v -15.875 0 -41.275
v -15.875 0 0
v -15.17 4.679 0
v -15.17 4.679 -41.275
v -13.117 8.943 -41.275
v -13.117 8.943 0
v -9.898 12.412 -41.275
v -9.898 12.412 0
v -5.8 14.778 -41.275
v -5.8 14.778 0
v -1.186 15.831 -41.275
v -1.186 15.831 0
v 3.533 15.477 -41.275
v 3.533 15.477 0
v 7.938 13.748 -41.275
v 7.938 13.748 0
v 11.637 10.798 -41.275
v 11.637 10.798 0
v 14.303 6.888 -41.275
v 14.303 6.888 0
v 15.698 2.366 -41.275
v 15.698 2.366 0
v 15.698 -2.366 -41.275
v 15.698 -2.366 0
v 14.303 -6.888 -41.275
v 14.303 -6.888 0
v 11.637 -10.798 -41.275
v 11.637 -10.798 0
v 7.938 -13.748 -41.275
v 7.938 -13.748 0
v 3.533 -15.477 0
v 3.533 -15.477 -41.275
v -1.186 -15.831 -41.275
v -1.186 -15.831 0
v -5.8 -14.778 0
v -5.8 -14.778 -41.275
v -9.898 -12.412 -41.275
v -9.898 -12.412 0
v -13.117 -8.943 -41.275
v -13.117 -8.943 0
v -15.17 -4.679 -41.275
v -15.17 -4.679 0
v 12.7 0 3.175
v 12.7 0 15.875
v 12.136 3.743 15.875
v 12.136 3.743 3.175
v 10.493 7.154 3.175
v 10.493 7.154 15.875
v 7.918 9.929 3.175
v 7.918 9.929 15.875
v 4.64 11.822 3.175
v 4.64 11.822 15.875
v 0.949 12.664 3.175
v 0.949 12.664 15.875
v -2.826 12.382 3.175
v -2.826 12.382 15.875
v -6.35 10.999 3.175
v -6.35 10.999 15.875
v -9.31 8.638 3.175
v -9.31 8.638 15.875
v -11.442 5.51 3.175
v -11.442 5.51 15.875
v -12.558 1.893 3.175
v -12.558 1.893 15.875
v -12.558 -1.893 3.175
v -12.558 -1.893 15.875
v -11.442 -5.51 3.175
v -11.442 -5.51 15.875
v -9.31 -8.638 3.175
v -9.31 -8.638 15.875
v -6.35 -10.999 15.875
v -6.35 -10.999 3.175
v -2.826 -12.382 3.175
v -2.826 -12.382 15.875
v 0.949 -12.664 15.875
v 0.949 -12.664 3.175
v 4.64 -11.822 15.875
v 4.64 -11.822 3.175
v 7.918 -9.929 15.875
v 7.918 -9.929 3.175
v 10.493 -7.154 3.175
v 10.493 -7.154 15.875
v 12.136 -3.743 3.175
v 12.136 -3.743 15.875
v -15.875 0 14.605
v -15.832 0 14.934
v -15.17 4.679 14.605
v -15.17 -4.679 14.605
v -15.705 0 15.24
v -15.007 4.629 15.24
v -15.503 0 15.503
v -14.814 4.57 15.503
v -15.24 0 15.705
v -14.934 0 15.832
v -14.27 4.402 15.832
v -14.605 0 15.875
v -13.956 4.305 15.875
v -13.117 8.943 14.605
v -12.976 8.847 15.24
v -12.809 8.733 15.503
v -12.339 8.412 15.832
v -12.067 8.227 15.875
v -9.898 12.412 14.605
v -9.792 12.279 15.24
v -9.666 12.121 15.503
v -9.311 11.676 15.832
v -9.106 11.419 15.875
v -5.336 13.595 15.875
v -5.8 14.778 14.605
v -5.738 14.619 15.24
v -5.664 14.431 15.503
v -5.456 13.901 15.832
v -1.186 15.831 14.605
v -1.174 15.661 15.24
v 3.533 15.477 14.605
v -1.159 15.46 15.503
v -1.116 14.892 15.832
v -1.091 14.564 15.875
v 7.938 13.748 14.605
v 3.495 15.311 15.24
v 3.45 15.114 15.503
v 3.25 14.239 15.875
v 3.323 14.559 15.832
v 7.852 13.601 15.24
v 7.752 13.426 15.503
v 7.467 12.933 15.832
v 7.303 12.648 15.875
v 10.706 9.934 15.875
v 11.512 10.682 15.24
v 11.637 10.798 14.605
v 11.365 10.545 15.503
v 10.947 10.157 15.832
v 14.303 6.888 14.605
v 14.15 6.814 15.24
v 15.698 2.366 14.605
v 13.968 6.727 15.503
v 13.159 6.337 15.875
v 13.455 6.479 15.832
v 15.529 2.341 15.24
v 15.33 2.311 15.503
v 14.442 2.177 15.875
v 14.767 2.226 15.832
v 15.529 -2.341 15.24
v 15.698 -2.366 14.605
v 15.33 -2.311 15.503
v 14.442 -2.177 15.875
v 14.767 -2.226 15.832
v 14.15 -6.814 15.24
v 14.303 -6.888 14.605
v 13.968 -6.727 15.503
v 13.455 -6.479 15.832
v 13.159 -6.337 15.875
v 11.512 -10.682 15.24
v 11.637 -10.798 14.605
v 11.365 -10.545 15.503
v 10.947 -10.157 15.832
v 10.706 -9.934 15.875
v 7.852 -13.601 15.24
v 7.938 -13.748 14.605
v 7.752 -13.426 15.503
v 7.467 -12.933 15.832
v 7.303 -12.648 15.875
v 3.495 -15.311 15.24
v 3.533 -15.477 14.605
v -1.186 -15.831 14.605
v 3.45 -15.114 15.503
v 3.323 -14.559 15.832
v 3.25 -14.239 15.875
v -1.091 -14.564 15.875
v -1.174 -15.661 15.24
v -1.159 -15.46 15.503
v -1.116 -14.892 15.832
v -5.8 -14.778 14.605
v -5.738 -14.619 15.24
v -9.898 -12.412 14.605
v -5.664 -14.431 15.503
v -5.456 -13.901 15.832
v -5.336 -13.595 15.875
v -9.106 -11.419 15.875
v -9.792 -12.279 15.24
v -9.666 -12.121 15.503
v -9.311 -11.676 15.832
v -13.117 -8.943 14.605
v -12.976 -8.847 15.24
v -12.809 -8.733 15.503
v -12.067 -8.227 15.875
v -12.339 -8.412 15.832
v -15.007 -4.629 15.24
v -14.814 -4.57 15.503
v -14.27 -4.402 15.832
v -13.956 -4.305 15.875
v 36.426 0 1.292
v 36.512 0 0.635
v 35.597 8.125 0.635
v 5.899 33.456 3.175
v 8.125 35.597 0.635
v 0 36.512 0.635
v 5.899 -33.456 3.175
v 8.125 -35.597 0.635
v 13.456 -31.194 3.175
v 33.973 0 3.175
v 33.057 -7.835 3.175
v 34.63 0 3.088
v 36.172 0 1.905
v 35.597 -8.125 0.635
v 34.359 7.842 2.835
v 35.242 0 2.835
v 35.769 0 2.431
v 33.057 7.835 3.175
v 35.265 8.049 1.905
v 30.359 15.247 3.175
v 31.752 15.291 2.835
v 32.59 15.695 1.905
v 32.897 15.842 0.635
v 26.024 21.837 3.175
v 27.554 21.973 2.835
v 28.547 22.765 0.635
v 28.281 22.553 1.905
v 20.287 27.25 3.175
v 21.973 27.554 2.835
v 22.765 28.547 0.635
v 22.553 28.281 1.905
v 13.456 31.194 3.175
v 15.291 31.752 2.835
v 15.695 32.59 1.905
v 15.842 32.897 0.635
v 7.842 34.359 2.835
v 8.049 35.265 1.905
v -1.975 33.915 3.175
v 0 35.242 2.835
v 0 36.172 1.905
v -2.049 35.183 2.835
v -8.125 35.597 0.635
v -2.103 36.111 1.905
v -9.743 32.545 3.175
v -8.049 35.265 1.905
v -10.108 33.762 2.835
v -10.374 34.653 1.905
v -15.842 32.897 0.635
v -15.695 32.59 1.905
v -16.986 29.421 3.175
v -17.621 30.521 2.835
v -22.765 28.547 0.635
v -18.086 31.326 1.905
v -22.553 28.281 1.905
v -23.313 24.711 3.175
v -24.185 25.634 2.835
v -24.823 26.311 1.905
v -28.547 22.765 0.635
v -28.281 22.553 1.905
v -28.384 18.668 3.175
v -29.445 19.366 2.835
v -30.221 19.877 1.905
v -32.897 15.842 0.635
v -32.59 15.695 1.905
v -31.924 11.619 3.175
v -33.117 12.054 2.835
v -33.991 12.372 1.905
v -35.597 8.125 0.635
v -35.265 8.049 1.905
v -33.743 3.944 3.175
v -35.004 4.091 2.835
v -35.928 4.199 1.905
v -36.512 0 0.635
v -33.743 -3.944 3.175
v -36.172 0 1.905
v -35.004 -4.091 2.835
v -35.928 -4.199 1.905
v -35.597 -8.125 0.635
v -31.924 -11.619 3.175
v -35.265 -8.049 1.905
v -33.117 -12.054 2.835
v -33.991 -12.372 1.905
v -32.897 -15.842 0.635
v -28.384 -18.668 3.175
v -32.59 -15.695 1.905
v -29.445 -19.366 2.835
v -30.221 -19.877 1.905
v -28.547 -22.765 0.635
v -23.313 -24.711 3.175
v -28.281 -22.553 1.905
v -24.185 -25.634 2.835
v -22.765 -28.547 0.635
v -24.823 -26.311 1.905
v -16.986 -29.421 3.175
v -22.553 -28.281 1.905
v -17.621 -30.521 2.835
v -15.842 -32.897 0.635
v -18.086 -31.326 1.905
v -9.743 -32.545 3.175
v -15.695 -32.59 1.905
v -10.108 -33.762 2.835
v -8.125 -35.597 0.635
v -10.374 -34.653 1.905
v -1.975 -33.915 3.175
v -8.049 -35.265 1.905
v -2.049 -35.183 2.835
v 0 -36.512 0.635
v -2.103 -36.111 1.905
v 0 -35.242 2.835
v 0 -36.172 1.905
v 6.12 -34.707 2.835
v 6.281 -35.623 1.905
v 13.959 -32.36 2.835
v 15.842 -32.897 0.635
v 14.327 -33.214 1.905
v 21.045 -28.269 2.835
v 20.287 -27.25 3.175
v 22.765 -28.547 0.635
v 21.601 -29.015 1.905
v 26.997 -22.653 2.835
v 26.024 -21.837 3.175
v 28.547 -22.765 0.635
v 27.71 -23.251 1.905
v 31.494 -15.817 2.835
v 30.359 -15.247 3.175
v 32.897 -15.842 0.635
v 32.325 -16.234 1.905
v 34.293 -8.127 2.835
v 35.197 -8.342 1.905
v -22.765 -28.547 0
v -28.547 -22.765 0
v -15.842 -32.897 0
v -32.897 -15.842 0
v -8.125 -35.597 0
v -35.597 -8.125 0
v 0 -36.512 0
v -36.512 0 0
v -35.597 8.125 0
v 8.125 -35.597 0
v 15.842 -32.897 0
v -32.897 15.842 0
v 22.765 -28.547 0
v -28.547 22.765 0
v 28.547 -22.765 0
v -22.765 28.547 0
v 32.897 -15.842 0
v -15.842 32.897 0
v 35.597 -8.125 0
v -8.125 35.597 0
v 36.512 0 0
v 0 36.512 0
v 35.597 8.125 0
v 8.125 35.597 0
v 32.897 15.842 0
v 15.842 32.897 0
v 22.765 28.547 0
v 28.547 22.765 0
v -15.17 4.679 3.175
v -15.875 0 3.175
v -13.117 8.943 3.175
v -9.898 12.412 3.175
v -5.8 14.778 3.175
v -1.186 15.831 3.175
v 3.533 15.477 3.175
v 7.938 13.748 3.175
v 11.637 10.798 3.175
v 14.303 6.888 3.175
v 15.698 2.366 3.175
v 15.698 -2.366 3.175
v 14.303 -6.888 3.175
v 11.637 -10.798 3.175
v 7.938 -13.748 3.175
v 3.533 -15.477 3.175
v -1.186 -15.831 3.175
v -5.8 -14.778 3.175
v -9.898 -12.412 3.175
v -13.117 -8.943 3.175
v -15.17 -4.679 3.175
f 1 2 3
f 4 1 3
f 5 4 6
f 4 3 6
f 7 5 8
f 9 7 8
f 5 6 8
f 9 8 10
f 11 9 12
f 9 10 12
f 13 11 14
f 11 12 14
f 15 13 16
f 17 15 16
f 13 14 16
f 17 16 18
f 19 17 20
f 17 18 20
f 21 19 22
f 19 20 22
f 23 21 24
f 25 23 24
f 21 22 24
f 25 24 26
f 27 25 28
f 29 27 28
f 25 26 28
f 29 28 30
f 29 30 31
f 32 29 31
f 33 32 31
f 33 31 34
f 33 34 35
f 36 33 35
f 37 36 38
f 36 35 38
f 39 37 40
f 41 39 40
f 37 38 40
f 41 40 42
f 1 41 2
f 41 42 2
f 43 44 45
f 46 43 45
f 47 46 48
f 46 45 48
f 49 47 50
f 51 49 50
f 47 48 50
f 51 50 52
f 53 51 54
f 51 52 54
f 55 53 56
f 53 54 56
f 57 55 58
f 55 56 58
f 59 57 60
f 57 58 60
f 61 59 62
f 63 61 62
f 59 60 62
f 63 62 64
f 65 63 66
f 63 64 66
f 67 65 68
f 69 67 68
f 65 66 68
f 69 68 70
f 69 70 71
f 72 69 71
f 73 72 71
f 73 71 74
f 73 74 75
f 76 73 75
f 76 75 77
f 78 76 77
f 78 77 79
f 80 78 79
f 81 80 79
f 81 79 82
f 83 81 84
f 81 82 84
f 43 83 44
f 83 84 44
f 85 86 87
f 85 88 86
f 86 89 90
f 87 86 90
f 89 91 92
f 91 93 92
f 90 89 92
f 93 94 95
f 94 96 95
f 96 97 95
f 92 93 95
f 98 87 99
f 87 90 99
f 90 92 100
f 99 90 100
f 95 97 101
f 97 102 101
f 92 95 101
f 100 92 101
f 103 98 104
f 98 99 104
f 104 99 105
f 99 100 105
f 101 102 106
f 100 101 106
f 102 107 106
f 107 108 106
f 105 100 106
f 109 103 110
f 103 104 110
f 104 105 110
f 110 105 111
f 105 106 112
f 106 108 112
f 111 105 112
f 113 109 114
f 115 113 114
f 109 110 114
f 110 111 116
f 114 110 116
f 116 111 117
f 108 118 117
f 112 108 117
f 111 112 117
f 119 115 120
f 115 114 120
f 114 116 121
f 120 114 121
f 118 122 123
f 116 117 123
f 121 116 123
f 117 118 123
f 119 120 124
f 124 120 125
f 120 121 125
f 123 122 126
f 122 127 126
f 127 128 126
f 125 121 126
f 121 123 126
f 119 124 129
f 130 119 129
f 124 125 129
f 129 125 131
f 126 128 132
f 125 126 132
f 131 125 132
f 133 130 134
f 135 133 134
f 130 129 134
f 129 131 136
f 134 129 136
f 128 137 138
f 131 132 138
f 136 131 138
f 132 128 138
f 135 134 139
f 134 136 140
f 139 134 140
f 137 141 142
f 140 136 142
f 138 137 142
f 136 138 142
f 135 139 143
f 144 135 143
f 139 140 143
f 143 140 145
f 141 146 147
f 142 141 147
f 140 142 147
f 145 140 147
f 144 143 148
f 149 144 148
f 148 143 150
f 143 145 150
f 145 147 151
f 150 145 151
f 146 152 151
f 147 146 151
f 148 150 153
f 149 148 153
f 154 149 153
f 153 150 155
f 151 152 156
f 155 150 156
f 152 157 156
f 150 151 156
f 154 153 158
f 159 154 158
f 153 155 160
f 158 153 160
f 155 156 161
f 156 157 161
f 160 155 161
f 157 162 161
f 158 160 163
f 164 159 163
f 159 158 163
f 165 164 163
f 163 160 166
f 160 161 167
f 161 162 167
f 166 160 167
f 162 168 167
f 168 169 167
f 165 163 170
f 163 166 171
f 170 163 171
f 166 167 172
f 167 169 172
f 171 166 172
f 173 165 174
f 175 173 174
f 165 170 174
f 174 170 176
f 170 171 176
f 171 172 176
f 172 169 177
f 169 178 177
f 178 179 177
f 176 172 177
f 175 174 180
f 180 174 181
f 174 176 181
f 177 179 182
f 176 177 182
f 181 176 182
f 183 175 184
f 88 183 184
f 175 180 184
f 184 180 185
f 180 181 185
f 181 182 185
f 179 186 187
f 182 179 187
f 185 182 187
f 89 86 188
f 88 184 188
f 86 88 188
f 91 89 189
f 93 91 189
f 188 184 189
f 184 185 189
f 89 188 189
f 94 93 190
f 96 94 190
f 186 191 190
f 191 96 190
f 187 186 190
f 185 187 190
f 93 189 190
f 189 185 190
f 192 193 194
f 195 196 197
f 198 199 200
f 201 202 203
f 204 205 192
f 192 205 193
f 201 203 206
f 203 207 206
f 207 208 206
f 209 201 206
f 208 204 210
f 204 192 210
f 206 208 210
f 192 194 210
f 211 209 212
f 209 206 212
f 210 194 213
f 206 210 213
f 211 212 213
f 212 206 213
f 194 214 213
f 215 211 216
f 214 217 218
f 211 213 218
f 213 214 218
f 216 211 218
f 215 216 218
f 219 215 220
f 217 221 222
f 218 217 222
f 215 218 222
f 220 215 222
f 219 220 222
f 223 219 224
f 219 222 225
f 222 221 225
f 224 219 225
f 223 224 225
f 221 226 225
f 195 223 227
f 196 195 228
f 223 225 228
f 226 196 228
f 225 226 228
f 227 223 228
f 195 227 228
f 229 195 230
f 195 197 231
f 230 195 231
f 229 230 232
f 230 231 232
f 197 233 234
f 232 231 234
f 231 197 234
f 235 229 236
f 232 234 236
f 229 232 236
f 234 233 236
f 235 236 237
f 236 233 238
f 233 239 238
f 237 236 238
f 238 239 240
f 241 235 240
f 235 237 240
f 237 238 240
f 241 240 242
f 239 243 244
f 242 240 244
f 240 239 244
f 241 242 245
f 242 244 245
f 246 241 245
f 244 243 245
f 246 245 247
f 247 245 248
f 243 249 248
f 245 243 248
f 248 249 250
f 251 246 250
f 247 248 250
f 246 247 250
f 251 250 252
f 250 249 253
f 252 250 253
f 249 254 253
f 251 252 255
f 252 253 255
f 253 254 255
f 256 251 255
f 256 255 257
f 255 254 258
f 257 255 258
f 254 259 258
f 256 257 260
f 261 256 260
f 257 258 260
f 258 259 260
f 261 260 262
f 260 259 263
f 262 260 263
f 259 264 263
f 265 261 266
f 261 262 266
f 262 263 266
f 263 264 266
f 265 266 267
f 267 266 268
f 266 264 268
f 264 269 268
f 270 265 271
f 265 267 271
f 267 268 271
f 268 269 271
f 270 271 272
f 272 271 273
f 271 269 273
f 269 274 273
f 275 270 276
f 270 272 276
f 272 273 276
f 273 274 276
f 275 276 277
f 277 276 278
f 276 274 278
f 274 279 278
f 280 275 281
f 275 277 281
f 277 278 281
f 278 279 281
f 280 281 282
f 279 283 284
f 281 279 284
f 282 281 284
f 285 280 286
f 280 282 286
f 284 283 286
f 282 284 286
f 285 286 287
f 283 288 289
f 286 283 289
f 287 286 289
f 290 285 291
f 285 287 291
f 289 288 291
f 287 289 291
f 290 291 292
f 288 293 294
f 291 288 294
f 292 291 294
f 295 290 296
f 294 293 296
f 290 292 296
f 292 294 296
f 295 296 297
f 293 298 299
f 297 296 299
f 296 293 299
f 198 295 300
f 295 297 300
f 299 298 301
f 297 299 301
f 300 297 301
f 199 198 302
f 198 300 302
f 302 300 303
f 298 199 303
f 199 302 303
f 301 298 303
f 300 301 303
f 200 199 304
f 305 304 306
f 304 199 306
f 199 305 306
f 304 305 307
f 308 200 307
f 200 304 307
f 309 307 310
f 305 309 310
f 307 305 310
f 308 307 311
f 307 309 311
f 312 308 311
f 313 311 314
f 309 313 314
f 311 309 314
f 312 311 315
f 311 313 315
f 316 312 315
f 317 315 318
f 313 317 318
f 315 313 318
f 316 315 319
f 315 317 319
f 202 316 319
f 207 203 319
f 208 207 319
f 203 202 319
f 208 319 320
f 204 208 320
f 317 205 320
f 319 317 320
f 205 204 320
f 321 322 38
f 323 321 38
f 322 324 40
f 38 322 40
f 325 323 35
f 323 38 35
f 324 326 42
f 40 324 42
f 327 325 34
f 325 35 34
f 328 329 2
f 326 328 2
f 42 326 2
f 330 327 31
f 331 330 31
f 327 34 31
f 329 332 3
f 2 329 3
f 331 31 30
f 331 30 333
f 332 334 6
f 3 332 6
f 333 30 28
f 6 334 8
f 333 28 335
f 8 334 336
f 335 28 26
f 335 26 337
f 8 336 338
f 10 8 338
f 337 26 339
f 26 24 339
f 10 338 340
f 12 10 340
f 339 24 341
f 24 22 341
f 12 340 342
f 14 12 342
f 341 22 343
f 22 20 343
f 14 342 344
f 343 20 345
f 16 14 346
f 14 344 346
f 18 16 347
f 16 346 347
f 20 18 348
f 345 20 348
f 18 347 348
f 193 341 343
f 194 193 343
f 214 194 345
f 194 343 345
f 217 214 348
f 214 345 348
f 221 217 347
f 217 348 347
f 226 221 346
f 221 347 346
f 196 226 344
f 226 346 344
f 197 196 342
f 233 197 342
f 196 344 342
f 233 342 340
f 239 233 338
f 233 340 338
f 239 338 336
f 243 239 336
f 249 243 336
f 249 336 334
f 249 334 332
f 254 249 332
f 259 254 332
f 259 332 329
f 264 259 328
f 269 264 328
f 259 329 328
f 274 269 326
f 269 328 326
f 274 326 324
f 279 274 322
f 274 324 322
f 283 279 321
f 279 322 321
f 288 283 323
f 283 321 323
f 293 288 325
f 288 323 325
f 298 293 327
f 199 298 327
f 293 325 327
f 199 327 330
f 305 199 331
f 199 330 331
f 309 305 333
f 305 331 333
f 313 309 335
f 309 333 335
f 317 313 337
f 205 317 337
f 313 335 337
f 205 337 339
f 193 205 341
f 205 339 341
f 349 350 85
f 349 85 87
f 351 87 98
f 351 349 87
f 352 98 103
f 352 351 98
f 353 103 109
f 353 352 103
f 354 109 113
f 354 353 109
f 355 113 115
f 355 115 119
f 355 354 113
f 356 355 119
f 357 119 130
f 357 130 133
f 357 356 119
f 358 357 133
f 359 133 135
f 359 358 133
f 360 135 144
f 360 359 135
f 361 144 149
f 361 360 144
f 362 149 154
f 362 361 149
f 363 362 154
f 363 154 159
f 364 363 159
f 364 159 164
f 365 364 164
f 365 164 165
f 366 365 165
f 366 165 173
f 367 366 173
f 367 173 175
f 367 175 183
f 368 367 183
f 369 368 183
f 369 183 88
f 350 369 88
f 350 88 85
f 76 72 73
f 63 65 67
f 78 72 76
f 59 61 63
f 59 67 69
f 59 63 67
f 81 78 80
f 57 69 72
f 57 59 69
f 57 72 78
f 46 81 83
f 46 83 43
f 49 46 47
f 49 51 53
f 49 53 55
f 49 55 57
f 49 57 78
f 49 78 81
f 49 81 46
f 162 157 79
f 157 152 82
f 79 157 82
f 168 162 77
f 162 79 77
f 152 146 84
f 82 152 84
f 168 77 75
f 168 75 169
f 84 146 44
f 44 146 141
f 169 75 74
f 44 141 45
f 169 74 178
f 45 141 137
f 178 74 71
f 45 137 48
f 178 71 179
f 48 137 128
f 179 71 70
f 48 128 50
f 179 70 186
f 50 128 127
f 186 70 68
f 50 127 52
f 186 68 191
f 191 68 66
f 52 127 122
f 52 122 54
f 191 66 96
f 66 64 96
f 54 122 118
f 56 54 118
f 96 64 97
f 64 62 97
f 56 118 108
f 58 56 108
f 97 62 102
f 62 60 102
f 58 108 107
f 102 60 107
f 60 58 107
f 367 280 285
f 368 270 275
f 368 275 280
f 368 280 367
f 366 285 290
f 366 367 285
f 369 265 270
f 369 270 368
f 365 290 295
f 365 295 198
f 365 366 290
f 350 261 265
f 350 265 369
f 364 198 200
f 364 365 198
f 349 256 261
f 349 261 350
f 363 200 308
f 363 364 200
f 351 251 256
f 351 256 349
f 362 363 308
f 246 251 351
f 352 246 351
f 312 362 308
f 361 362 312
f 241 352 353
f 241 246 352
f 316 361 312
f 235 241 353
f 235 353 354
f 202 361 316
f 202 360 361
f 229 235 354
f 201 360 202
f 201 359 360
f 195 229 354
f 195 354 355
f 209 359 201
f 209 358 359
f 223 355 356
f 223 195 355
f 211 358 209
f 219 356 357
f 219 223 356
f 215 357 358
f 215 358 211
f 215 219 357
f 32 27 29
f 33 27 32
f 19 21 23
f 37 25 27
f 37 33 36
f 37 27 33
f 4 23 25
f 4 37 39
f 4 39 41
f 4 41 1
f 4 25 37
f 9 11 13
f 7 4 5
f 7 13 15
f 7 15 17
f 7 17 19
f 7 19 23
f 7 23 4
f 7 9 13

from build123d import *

# Parameters (mm, degrees)
SKETCH1_R           = 36.5125
BOSS_EXTRUDE1_DEPTH = 3.175
SKETCH2_R           = 15.875
BOSS_EXTRUDE2_DEPTH = 41.275
BOSS_EXTRUDE3_START = -15.875
SKETCH2_2_R         = 15.875
BOSS_EXTRUDE3_DEPTH = 15.875
SKETCH3_R           = 12.7
CUT_EXTRUDE1_DEPTH  = 12.7
FILLET1_R           = 2.54
FILLET2_R           = 1.27


with BuildPart() as part:
    # Sketch1 → Boss-Extrude1 (new body)
    with BuildSketch(Plane.XY):
        Circle(SKETCH1_R)
    extrude(amount=BOSS_EXTRUDE1_DEPTH)

    # Sketch2 → Boss-Extrude2 (add)
    with BuildSketch(Plane(origin=(0, 0, 0), x_dir=(-1, 0, 0), z_dir=(0, 0, -1))):
        Circle(SKETCH2_R)
    extrude(amount=BOSS_EXTRUDE2_DEPTH)

    # Sketch2<2> → Boss-Extrude3 (add)
    with BuildSketch(Plane(origin=(0, 0, 0), x_dir=(-1, 0, 0), z_dir=(0, 0, -1)).offset(BOSS_EXTRUDE3_START)):
        Circle(SKETCH2_2_R)
    extrude(amount=BOSS_EXTRUDE3_DEPTH)

    # Sketch3 → Cut-Extrude1 (cut)
    with BuildSketch(Plane.XY.offset(15.875)):
        Circle(SKETCH3_R)
    extrude(amount=-CUT_EXTRUDE1_DEPTH, mode=Mode.SUBTRACT)

    # Fillet1
    fillet1_edges = [part.edges().sort_by_distance(p)[0] for p in [
        (-36.5125, 0, 3.175),
    ]]
    fillet(fillet1_edges, radius=FILLET1_R)

    # Fillet2
    fillet2_edges = [part.edges().sort_by_distance(p)[0] for p in [
        (15.875, 0, 15.875),
    ]]
    fillet(fillet2_edges, radius=FILLET2_R)


solid = part.part
